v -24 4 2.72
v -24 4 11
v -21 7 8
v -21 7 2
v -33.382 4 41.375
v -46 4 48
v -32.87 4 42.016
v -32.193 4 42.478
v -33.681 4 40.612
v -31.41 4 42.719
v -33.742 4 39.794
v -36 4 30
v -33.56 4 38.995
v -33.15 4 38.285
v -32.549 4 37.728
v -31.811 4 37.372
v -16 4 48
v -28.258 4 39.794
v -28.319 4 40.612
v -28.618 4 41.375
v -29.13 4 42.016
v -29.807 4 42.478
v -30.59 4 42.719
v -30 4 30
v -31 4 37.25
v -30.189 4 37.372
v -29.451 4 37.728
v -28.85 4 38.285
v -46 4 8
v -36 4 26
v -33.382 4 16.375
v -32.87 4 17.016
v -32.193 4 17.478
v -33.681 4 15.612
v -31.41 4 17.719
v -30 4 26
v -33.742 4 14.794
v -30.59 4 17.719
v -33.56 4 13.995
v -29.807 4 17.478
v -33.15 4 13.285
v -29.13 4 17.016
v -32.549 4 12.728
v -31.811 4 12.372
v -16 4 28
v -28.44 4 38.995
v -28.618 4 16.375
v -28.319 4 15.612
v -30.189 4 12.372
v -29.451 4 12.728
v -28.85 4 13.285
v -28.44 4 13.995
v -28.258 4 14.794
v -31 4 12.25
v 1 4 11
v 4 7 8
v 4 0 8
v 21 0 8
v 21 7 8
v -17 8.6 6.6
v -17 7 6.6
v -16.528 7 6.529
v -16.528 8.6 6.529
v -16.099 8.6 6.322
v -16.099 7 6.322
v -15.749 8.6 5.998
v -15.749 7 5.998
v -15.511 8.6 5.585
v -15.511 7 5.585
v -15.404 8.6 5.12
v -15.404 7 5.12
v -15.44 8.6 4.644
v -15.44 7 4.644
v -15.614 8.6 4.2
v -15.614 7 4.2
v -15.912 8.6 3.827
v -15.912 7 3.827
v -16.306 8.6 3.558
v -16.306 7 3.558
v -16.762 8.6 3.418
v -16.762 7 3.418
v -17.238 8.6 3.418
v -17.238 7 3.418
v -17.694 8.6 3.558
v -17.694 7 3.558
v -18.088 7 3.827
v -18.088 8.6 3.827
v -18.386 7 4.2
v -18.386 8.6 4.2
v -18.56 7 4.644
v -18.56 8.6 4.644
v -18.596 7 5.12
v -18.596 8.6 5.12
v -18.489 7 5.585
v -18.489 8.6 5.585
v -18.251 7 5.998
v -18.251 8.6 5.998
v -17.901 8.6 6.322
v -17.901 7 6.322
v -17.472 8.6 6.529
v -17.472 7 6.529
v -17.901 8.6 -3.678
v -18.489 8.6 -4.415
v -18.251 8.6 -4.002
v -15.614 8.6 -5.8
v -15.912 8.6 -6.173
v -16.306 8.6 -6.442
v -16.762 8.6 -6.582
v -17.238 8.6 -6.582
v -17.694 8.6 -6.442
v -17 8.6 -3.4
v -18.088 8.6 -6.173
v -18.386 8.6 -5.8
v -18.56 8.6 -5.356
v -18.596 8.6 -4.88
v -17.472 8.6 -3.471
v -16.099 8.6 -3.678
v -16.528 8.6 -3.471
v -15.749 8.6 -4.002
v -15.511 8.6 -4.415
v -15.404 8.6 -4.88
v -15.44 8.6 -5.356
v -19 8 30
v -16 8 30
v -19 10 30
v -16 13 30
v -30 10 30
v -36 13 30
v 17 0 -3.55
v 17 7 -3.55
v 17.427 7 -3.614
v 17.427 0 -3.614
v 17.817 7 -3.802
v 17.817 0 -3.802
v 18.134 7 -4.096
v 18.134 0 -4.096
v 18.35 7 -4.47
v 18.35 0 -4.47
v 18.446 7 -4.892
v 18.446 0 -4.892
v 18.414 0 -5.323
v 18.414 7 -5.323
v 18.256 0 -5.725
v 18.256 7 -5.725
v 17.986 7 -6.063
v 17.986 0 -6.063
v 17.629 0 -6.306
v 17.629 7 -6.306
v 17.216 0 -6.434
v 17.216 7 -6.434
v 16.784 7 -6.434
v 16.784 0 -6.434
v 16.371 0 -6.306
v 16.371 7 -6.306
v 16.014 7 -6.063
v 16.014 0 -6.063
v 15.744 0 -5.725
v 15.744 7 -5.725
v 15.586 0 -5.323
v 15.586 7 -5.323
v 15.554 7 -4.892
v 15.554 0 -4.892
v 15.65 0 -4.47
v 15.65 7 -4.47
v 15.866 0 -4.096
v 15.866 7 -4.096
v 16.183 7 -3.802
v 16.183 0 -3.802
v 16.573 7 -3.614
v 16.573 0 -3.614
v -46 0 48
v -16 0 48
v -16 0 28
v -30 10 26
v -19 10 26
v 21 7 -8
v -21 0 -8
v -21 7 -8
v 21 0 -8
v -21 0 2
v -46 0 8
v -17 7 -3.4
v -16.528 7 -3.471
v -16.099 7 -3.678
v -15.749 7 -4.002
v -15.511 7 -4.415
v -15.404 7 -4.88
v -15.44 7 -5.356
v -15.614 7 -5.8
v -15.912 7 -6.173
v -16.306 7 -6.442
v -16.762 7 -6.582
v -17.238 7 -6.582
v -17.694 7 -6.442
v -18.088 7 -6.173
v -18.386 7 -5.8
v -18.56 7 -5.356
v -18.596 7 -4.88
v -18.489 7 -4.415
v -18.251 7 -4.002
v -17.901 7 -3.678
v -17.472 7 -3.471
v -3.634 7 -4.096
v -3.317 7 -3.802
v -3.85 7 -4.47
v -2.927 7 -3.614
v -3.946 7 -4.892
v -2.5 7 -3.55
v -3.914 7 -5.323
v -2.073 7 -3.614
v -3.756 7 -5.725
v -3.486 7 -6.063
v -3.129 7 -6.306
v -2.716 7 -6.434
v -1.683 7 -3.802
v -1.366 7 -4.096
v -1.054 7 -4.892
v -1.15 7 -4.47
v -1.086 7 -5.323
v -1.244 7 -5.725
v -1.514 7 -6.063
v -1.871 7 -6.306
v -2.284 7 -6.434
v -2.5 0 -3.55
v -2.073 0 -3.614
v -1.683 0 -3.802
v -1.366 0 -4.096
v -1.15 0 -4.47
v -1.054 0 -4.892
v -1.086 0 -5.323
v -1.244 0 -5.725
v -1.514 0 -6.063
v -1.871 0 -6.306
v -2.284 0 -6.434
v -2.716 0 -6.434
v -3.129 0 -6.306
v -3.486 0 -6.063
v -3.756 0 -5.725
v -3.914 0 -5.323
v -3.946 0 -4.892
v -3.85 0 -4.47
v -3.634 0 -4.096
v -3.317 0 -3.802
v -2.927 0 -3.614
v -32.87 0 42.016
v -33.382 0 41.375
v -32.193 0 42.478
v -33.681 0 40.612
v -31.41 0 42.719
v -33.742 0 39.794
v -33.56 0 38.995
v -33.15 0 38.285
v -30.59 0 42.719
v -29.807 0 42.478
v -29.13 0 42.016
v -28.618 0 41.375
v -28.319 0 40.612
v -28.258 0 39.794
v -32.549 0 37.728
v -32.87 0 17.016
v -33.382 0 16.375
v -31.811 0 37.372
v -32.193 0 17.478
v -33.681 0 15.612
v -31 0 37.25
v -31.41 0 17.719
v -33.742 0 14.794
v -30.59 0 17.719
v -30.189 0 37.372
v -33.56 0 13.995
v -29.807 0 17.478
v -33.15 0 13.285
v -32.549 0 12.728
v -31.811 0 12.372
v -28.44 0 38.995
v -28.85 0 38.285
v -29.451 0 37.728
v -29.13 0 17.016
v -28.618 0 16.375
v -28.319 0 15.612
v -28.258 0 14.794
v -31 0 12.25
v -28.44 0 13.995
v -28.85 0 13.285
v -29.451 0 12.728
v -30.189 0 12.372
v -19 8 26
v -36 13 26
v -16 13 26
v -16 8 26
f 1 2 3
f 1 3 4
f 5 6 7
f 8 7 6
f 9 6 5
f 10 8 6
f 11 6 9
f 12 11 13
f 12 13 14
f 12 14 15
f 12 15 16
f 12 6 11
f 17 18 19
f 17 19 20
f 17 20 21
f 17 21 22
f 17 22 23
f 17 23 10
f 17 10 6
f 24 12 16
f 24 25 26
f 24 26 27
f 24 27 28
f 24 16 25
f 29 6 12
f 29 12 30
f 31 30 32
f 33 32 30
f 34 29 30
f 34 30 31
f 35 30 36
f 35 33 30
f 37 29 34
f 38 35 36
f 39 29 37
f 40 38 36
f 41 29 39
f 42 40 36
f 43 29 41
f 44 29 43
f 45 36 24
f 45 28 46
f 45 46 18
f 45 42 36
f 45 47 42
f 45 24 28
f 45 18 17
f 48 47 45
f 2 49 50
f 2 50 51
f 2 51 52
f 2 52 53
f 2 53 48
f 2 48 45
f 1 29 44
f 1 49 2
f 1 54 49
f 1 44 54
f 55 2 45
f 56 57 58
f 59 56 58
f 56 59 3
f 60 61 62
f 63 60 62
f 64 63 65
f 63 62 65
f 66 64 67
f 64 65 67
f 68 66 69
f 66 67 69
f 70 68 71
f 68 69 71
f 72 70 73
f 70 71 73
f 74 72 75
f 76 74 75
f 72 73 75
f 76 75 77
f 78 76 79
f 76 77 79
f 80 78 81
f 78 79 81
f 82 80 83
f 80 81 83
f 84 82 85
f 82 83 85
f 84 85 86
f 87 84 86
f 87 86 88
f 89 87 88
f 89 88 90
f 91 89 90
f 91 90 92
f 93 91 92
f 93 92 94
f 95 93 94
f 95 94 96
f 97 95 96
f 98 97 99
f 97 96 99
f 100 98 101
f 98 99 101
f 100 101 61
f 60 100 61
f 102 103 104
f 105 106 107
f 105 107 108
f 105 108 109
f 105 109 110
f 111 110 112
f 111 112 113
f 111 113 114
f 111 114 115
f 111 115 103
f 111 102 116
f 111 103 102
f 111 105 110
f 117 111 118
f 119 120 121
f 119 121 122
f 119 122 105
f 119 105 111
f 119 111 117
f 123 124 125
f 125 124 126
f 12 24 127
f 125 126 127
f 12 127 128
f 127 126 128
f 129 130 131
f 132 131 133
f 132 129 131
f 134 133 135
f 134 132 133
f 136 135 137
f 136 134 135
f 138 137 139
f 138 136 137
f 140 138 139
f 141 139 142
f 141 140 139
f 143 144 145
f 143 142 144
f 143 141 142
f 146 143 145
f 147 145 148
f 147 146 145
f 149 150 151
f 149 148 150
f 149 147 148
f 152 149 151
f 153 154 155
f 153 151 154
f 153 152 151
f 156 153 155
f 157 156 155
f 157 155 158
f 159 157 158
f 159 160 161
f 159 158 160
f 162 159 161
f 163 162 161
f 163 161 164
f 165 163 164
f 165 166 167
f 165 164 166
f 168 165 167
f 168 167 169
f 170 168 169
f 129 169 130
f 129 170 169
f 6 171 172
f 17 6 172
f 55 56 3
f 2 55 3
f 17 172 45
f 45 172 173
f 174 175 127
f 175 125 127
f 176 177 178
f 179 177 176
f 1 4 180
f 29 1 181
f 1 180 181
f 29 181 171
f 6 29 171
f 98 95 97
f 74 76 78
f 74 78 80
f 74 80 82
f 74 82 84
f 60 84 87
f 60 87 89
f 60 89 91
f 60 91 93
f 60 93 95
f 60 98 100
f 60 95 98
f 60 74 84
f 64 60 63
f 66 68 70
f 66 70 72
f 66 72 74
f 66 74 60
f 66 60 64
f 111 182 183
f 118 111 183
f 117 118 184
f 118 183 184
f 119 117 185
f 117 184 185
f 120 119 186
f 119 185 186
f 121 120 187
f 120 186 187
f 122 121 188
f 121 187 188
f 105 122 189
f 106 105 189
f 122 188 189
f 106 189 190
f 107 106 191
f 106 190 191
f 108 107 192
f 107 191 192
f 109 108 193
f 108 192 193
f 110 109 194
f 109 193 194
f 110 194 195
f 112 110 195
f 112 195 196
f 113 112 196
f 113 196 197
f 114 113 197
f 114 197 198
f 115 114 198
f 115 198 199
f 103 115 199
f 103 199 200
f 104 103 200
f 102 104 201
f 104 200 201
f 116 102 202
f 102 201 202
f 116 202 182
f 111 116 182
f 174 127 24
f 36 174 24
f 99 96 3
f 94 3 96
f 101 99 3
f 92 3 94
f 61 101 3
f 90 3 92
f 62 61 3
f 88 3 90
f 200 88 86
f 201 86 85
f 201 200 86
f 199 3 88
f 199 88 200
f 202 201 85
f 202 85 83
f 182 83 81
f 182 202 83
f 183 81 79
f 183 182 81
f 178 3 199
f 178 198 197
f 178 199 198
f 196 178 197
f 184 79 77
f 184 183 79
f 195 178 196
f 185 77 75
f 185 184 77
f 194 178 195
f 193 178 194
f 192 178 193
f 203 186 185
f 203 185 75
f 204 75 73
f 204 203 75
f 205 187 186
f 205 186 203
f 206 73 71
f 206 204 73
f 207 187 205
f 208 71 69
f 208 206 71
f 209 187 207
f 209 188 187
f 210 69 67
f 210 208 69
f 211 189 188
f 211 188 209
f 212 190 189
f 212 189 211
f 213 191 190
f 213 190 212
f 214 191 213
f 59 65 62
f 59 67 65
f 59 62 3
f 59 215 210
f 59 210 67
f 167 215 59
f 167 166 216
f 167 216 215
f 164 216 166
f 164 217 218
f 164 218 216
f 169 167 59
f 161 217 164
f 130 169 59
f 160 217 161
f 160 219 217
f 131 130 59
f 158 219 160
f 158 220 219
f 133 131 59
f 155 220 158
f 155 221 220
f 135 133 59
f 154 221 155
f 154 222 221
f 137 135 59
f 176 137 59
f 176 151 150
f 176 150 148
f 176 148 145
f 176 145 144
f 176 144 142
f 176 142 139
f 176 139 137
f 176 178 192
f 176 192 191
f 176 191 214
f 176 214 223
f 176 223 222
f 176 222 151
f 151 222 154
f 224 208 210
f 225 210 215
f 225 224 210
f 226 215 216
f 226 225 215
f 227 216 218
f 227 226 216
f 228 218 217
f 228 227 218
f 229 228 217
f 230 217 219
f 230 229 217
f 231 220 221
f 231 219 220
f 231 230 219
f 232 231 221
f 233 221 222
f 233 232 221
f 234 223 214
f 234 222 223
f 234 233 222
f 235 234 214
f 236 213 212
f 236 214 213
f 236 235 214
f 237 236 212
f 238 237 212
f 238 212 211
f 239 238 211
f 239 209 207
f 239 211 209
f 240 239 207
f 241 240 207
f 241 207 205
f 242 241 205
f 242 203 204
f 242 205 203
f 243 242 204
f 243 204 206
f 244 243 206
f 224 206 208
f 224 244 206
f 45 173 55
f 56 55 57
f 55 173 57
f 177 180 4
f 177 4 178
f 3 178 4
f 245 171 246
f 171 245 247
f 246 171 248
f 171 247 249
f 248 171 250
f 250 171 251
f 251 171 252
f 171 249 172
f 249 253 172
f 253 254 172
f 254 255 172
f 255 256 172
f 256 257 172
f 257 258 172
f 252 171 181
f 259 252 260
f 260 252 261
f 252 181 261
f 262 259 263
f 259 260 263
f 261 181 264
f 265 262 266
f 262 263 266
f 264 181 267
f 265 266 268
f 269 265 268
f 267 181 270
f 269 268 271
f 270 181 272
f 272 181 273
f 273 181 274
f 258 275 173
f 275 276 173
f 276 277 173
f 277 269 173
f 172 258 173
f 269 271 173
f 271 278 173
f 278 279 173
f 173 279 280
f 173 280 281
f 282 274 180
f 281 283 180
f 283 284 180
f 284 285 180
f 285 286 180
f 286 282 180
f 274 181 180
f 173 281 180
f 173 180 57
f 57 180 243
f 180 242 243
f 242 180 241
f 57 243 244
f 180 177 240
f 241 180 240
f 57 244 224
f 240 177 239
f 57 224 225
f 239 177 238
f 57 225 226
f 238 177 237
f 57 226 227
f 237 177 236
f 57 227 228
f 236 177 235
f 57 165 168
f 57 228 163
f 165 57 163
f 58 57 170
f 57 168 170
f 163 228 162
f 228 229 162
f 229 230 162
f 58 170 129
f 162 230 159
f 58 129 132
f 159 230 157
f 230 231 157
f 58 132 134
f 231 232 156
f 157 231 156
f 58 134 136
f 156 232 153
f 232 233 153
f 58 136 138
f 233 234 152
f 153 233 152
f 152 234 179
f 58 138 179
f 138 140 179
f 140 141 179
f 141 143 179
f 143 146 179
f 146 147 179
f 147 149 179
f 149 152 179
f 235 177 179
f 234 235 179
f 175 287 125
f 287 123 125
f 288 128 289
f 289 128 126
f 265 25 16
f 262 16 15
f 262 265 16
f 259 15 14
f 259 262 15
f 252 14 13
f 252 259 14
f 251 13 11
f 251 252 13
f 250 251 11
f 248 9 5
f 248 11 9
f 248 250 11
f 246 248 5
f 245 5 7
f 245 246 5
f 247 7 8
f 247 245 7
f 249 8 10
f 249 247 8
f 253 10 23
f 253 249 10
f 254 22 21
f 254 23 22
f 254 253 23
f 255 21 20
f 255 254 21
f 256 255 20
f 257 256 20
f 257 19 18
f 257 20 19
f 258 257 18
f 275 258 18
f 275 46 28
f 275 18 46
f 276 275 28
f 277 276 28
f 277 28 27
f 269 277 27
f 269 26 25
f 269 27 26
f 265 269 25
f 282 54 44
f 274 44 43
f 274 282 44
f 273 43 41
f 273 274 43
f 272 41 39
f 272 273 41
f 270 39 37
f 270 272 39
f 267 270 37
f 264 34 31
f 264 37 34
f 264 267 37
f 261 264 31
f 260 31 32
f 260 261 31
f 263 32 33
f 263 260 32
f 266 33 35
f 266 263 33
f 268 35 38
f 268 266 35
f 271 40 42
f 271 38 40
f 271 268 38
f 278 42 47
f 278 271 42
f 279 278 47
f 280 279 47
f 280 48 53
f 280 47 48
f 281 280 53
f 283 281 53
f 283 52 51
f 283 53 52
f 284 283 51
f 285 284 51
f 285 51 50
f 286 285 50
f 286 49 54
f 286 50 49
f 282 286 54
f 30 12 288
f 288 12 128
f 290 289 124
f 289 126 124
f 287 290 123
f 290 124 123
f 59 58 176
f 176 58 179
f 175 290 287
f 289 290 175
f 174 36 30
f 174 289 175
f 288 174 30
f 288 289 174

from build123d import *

# Parameters (mm, degrees)
SKETCH1_W           = 42
SKETCH1_H           = 16
BOSS_EXTRUDE1_DEPTH = 7
SKETCH2_R           = 1.6
BOSS_EXTRUDE2_DEPTH = 1.6
CUT_EXTRUDE1_REACH  = 26.062
SKETCH3_R           = 1.45
BOSS_EXTRUDE6_DEPTH = 4
CUT_EXTRUDE2_REACH  = 69.037
SKETCH8_R           = 2.75
BOSS_EXTRUDE7_DEPTH = 2
CHAMFER2_SIZE       = 3


with BuildPart() as part:
    # Sketch1 → Boss-Extrude1 (new body)
    with BuildSketch(Plane(origin=(0, 0, 0), x_dir=(1, 0, 0), z_dir=(0, 1, 0))):
        Rectangle(SKETCH1_W, SKETCH1_H)
    extrude(amount=BOSS_EXTRUDE1_DEPTH)

    # Sketch2 → Boss-Extrude2 (add)
    with BuildSketch(Plane(origin=(0, 7, 0), x_dir=(1, 0, 0), z_dir=(0, 1, 0))):
        with Locations(Location((-17, 5, 0), (0, 0, 270))):
            Circle(SKETCH2_R)
        with Locations(Location((-17, -5, 0), (0, 0, 270))):
            Circle(SKETCH2_R)
    extrude(amount=BOSS_EXTRUDE2_DEPTH)

    # Sketch3 → Cut-Extrude1 (cut, up to next)
    with BuildSketch(Plane(origin=(0, 0, 0), x_dir=(1, 0, 0), z_dir=(0, 1, 0)), mode=Mode.PRIVATE) as cut_extrude1_sk1:
        with Locations(Location((-2.5, 5, 0), (0, 0, 270))):
            Circle(SKETCH3_R)
    cut_extrude1_tool1 = extrude(cut_extrude1_sk1.sketch, amount=CUT_EXTRUDE1_REACH, mode=Mode.PRIVATE) & part.part
    # Sketch3 → Cut-Extrude1 (cut, up to next)
    with BuildSketch(Plane(origin=(0, 0, 0), x_dir=(1, 0, 0), z_dir=(0, 1, 0)), mode=Mode.PRIVATE) as cut_extrude1_sk2:
        with Locations(Location((17, 5, 0), (0, 0, 270))):
            Circle(SKETCH3_R)
    cut_extrude1_tool2 = extrude(cut_extrude1_sk2.sketch, amount=CUT_EXTRUDE1_REACH, mode=Mode.PRIVATE) & part.part
    add(cut_extrude1_tool1.solids().sort_by_distance((-2.5, 0, -5))[0], mode=Mode.SUBTRACT)
    add(cut_extrude1_tool2.solids().sort_by_distance((17, 0, -5))[0], mode=Mode.SUBTRACT)

    # Sketch7 → Boss-Extrude6 (add)
    with BuildSketch(Plane(origin=(0, 0, 0), x_dir=(1, 0, 0), z_dir=(0, 1, 0))):
        Polygon((-21, -2), (-46, -8), (-46, -48), (-16, -48), (-16, -28), (4, -8), (-21, -8), align=None)
    extrude(amount=BOSS_EXTRUDE6_DEPTH)

    # Sketch8 → Cut-Extrude2 (cut, up to next)
    with BuildSketch(Plane(origin=(0, 0, 0), x_dir=(1, 0, 0), z_dir=(0, 1, 0)), mode=Mode.PRIVATE) as cut_extrude2_sk1:
        with Locations(Location((-31, -40, 0), (0, 0, 90))):
            Circle(SKETCH8_R)
    cut_extrude2_tool1 = extrude(cut_extrude2_sk1.sketch, amount=CUT_EXTRUDE2_REACH, mode=Mode.PRIVATE) & part.part
    # Sketch8 → Cut-Extrude2 (cut, up to next)
    with BuildSketch(Plane(origin=(0, 0, 0), x_dir=(1, 0, 0), z_dir=(0, 1, 0)), mode=Mode.PRIVATE) as cut_extrude2_sk2:
        with Locations(Location((-31, -15, 0), (0, 0, 90))):
            Circle(SKETCH8_R)
    cut_extrude2_tool2 = extrude(cut_extrude2_sk2.sketch, amount=CUT_EXTRUDE2_REACH, mode=Mode.PRIVATE) & part.part
    add(cut_extrude2_tool1.solids().sort_by_distance((-31, 0, 40))[0], mode=Mode.SUBTRACT)
    add(cut_extrude2_tool2.solids().sort_by_distance((-31, 0, 15))[0], mode=Mode.SUBTRACT)

    # Sketch9 → Boss-Extrude7 (add, symmetric)
    with BuildSketch(Plane.XY.offset(28)):
        Polygon((-36, 4), (-36, 13), (-16, 13), (-16, 8), (-19, 8), (-19, 10), (-30, 10), (-30, 4), align=None)
    extrude(amount=BOSS_EXTRUDE7_DEPTH, both=True)

    # Chamfer2
    chamfer2_edges = [part.edges().sort_by_distance(p)[0] for p in [
        (-21, 4, 5),
        (-8.5, 4, 8),
    ]]
    chamfer(chamfer2_edges, length=CHAMFER2_SIZE - 0.0001)  # a hair under: the kernel refuses the full size


solid = part.part
